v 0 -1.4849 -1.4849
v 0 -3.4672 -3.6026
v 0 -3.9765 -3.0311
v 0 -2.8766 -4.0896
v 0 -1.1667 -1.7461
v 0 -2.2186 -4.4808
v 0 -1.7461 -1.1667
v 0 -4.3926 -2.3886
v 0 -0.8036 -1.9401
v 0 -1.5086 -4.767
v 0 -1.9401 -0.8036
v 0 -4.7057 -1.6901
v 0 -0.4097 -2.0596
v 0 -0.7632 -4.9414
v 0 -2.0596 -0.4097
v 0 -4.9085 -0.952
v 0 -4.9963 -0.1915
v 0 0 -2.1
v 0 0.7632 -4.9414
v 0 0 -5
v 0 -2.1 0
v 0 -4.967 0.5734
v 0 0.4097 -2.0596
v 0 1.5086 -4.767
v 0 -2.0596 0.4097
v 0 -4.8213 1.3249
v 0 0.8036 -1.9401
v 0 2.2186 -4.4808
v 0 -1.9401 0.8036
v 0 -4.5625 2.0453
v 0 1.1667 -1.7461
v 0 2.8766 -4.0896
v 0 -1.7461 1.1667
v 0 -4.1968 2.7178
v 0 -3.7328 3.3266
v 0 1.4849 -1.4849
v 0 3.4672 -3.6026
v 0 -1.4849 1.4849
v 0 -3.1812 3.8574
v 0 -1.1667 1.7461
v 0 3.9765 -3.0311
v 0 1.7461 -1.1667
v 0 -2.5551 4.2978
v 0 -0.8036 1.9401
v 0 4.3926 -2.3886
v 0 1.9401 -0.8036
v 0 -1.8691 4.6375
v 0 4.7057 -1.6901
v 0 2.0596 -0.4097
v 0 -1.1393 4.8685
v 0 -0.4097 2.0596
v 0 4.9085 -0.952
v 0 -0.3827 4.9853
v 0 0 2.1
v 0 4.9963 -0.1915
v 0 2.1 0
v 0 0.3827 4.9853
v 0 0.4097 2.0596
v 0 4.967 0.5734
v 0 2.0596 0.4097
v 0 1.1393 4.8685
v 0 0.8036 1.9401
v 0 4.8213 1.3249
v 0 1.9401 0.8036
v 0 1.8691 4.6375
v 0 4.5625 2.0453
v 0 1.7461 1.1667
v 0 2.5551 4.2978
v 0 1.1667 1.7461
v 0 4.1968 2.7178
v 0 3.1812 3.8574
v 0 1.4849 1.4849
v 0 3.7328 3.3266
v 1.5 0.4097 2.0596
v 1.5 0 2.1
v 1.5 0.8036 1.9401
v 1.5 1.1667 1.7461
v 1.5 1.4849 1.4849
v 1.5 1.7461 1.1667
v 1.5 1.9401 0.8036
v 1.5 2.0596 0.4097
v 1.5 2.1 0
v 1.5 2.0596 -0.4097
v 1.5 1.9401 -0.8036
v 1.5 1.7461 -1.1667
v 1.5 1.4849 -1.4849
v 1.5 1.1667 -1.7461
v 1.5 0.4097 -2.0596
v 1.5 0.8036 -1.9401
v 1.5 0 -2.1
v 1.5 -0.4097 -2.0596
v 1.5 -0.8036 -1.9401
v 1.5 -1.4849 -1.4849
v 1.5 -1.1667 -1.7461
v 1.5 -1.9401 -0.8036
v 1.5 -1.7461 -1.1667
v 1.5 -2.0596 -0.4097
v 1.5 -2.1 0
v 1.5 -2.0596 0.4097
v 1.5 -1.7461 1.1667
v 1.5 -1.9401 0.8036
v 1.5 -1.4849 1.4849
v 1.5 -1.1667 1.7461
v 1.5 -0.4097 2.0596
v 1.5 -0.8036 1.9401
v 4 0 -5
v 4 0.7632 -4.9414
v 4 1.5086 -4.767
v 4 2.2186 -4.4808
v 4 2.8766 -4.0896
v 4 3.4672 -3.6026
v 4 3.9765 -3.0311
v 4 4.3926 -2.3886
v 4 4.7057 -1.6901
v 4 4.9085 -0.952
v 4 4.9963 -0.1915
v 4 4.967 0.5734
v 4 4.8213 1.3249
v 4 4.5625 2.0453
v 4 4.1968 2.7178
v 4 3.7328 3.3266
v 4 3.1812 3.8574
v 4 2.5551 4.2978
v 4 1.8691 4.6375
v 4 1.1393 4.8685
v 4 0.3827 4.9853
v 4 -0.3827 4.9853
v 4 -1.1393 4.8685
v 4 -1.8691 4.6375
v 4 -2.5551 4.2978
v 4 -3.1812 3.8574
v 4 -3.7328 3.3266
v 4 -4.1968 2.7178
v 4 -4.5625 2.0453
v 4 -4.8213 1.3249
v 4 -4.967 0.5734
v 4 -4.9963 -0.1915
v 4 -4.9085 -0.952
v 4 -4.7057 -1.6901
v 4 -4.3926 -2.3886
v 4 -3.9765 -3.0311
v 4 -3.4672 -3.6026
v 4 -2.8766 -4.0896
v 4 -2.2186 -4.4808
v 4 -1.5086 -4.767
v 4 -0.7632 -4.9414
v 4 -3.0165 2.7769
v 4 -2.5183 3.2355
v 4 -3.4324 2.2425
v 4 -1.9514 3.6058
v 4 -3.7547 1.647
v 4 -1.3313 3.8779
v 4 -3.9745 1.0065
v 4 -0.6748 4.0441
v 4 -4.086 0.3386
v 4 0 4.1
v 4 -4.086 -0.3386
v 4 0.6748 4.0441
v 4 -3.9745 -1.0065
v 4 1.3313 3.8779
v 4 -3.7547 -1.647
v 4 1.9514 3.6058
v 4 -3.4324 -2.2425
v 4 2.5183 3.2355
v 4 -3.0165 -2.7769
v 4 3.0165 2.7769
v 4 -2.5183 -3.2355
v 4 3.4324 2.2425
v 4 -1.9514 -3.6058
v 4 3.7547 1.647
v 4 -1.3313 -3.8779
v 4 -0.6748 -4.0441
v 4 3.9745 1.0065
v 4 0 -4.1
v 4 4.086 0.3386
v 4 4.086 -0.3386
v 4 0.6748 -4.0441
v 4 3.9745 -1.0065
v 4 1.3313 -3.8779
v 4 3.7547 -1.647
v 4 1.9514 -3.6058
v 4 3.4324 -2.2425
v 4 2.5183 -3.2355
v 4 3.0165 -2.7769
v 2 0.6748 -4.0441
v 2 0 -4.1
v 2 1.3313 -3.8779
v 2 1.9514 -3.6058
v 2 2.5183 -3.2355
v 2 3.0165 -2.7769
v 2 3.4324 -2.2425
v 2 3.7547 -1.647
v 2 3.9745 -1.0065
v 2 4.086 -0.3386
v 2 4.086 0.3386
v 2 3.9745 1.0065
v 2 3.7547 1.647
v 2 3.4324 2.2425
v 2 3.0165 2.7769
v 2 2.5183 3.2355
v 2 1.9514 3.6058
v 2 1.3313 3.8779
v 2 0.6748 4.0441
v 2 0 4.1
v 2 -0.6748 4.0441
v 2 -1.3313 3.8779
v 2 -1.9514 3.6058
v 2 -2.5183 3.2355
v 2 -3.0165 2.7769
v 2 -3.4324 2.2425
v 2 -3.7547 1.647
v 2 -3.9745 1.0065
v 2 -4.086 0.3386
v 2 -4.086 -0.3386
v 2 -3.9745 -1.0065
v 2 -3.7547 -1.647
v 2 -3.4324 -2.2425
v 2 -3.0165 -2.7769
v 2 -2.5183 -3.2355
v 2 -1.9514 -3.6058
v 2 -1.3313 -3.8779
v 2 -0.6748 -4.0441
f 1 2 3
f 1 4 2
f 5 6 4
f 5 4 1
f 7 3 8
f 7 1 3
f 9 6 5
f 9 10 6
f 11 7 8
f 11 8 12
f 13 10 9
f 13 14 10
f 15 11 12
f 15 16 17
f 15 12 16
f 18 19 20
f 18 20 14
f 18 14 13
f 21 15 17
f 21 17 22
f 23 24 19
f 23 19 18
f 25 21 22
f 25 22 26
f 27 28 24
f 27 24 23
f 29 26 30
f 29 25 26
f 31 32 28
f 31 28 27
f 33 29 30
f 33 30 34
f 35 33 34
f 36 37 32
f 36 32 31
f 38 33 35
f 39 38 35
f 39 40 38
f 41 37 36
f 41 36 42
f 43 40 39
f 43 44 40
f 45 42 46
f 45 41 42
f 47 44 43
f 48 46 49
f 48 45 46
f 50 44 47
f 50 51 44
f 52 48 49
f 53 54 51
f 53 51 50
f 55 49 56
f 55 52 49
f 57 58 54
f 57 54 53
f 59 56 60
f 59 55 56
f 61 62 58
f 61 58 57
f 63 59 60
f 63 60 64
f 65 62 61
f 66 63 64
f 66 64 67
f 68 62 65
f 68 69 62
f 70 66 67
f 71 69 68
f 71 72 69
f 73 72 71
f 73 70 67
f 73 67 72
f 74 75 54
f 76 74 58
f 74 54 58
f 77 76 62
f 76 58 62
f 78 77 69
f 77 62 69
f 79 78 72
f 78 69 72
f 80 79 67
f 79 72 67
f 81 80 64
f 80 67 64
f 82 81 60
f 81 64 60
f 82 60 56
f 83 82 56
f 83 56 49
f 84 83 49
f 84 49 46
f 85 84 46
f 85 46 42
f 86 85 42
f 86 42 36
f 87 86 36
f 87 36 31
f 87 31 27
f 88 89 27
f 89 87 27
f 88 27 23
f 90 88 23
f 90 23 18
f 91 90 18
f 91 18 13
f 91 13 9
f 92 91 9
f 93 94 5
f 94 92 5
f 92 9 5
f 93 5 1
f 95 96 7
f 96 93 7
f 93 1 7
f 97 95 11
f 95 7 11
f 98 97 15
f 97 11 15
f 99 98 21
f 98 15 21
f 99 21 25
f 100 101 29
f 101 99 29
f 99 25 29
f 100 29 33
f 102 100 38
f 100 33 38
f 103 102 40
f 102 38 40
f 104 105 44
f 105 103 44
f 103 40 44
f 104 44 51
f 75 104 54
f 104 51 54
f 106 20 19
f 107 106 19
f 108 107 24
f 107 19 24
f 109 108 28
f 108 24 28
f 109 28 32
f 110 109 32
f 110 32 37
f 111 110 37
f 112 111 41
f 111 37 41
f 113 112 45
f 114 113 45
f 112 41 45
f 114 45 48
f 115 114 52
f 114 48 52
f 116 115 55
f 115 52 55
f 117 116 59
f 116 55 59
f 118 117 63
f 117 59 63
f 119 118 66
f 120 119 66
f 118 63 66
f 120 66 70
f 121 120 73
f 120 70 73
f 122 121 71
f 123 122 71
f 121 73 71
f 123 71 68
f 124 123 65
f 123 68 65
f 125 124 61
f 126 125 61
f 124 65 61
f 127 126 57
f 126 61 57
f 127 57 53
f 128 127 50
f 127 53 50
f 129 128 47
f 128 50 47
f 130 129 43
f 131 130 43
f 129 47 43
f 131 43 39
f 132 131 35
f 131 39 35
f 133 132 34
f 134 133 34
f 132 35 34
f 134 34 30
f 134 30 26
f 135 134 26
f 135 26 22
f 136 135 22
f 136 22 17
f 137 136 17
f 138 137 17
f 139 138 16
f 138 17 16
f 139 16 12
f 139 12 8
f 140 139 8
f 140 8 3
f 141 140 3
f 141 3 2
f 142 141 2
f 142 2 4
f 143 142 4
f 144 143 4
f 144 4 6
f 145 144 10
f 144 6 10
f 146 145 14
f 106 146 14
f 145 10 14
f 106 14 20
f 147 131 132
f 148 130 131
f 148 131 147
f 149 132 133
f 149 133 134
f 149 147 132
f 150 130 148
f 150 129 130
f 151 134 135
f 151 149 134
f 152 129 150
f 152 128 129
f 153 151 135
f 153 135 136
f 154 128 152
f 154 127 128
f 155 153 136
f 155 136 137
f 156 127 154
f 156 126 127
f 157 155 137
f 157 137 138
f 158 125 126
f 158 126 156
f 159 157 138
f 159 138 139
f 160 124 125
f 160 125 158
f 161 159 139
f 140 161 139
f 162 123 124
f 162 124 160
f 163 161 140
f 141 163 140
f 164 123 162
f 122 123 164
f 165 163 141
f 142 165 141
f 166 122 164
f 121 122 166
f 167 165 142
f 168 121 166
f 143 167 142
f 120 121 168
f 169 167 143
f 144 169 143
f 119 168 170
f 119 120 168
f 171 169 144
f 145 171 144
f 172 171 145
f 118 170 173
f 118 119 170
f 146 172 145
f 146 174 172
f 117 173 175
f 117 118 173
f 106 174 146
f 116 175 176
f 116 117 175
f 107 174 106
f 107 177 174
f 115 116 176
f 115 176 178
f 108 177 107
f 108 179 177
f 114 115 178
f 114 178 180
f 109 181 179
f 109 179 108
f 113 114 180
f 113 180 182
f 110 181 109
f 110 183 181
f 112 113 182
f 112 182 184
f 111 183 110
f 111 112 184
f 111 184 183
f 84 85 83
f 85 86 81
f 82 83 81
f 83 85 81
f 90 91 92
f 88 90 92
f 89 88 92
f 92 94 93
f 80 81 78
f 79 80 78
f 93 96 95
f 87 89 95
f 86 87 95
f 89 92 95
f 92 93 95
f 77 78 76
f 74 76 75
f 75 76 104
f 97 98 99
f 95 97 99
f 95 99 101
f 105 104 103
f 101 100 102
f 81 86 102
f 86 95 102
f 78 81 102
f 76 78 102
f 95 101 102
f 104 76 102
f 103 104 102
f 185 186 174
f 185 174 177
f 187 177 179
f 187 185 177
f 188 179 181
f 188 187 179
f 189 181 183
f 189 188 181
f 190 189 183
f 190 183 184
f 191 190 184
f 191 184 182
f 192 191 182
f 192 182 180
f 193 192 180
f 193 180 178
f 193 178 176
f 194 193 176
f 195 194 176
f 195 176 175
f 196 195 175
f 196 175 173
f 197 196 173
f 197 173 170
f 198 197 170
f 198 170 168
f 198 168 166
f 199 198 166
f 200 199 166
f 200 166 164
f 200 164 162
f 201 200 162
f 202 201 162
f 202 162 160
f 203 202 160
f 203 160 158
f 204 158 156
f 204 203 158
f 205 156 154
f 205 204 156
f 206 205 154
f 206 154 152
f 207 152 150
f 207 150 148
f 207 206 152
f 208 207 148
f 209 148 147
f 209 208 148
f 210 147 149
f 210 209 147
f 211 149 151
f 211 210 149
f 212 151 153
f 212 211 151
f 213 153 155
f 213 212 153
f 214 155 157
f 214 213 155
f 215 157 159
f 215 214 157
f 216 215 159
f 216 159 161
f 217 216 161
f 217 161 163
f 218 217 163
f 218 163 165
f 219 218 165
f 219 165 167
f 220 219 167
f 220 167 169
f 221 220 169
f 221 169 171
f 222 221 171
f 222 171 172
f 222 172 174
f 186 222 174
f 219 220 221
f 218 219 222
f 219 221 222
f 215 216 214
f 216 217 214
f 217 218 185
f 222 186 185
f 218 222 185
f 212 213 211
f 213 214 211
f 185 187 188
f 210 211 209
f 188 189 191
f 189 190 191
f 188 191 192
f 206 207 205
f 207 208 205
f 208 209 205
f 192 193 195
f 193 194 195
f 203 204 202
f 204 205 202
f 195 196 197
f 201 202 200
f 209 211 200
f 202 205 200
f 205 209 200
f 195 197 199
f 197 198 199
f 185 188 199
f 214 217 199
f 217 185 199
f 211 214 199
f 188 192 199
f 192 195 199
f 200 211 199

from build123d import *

# Parameters (mm, degrees)
SKETCH1_R           = 5
SKETCH1_R_2         = 4.1
BOSS_EXTRUDE1_DEPTH = 4
SKETCH2_R           = 4.1
SKETCH2_R_2         = 2.1
BOSS_EXTRUDE2_DEPTH = 2
BOSS_EXTRUDE3_START = -0.5
SKETCH3_R           = 2.1
BOSS_EXTRUDE3_DEPTH = 0.5


with BuildPart() as part:
    # Sketch1 → Boss-Extrude1 (new body)
    with BuildSketch(Plane(origin=(0, 0, 0), x_dir=(0, 0, -1), z_dir=(1, 0, 0))):
        Circle(SKETCH1_R)
        Circle(SKETCH1_R_2, mode=Mode.SUBTRACT)
    extrude(amount=BOSS_EXTRUDE1_DEPTH)

    # Sketch2 → Boss-Extrude2 (add)
    with BuildSketch(Plane.ZY):
        Circle(SKETCH2_R)
        Circle(SKETCH2_R_2, mode=Mode.SUBTRACT)
    extrude(amount=-BOSS_EXTRUDE2_DEPTH)

    # Sketch3 → Boss-Extrude3 (add)
    with BuildSketch(Plane(origin=(2, 0, 0), x_dir=(0, 0, -1), z_dir=(1, 0, 0)).offset(BOSS_EXTRUDE3_START)):
        with Locations(Location((0, 0, 0), (0, 0, 180))):
            Circle(SKETCH3_R)
    extrude(amount=BOSS_EXTRUDE3_DEPTH)


solid = part.part
